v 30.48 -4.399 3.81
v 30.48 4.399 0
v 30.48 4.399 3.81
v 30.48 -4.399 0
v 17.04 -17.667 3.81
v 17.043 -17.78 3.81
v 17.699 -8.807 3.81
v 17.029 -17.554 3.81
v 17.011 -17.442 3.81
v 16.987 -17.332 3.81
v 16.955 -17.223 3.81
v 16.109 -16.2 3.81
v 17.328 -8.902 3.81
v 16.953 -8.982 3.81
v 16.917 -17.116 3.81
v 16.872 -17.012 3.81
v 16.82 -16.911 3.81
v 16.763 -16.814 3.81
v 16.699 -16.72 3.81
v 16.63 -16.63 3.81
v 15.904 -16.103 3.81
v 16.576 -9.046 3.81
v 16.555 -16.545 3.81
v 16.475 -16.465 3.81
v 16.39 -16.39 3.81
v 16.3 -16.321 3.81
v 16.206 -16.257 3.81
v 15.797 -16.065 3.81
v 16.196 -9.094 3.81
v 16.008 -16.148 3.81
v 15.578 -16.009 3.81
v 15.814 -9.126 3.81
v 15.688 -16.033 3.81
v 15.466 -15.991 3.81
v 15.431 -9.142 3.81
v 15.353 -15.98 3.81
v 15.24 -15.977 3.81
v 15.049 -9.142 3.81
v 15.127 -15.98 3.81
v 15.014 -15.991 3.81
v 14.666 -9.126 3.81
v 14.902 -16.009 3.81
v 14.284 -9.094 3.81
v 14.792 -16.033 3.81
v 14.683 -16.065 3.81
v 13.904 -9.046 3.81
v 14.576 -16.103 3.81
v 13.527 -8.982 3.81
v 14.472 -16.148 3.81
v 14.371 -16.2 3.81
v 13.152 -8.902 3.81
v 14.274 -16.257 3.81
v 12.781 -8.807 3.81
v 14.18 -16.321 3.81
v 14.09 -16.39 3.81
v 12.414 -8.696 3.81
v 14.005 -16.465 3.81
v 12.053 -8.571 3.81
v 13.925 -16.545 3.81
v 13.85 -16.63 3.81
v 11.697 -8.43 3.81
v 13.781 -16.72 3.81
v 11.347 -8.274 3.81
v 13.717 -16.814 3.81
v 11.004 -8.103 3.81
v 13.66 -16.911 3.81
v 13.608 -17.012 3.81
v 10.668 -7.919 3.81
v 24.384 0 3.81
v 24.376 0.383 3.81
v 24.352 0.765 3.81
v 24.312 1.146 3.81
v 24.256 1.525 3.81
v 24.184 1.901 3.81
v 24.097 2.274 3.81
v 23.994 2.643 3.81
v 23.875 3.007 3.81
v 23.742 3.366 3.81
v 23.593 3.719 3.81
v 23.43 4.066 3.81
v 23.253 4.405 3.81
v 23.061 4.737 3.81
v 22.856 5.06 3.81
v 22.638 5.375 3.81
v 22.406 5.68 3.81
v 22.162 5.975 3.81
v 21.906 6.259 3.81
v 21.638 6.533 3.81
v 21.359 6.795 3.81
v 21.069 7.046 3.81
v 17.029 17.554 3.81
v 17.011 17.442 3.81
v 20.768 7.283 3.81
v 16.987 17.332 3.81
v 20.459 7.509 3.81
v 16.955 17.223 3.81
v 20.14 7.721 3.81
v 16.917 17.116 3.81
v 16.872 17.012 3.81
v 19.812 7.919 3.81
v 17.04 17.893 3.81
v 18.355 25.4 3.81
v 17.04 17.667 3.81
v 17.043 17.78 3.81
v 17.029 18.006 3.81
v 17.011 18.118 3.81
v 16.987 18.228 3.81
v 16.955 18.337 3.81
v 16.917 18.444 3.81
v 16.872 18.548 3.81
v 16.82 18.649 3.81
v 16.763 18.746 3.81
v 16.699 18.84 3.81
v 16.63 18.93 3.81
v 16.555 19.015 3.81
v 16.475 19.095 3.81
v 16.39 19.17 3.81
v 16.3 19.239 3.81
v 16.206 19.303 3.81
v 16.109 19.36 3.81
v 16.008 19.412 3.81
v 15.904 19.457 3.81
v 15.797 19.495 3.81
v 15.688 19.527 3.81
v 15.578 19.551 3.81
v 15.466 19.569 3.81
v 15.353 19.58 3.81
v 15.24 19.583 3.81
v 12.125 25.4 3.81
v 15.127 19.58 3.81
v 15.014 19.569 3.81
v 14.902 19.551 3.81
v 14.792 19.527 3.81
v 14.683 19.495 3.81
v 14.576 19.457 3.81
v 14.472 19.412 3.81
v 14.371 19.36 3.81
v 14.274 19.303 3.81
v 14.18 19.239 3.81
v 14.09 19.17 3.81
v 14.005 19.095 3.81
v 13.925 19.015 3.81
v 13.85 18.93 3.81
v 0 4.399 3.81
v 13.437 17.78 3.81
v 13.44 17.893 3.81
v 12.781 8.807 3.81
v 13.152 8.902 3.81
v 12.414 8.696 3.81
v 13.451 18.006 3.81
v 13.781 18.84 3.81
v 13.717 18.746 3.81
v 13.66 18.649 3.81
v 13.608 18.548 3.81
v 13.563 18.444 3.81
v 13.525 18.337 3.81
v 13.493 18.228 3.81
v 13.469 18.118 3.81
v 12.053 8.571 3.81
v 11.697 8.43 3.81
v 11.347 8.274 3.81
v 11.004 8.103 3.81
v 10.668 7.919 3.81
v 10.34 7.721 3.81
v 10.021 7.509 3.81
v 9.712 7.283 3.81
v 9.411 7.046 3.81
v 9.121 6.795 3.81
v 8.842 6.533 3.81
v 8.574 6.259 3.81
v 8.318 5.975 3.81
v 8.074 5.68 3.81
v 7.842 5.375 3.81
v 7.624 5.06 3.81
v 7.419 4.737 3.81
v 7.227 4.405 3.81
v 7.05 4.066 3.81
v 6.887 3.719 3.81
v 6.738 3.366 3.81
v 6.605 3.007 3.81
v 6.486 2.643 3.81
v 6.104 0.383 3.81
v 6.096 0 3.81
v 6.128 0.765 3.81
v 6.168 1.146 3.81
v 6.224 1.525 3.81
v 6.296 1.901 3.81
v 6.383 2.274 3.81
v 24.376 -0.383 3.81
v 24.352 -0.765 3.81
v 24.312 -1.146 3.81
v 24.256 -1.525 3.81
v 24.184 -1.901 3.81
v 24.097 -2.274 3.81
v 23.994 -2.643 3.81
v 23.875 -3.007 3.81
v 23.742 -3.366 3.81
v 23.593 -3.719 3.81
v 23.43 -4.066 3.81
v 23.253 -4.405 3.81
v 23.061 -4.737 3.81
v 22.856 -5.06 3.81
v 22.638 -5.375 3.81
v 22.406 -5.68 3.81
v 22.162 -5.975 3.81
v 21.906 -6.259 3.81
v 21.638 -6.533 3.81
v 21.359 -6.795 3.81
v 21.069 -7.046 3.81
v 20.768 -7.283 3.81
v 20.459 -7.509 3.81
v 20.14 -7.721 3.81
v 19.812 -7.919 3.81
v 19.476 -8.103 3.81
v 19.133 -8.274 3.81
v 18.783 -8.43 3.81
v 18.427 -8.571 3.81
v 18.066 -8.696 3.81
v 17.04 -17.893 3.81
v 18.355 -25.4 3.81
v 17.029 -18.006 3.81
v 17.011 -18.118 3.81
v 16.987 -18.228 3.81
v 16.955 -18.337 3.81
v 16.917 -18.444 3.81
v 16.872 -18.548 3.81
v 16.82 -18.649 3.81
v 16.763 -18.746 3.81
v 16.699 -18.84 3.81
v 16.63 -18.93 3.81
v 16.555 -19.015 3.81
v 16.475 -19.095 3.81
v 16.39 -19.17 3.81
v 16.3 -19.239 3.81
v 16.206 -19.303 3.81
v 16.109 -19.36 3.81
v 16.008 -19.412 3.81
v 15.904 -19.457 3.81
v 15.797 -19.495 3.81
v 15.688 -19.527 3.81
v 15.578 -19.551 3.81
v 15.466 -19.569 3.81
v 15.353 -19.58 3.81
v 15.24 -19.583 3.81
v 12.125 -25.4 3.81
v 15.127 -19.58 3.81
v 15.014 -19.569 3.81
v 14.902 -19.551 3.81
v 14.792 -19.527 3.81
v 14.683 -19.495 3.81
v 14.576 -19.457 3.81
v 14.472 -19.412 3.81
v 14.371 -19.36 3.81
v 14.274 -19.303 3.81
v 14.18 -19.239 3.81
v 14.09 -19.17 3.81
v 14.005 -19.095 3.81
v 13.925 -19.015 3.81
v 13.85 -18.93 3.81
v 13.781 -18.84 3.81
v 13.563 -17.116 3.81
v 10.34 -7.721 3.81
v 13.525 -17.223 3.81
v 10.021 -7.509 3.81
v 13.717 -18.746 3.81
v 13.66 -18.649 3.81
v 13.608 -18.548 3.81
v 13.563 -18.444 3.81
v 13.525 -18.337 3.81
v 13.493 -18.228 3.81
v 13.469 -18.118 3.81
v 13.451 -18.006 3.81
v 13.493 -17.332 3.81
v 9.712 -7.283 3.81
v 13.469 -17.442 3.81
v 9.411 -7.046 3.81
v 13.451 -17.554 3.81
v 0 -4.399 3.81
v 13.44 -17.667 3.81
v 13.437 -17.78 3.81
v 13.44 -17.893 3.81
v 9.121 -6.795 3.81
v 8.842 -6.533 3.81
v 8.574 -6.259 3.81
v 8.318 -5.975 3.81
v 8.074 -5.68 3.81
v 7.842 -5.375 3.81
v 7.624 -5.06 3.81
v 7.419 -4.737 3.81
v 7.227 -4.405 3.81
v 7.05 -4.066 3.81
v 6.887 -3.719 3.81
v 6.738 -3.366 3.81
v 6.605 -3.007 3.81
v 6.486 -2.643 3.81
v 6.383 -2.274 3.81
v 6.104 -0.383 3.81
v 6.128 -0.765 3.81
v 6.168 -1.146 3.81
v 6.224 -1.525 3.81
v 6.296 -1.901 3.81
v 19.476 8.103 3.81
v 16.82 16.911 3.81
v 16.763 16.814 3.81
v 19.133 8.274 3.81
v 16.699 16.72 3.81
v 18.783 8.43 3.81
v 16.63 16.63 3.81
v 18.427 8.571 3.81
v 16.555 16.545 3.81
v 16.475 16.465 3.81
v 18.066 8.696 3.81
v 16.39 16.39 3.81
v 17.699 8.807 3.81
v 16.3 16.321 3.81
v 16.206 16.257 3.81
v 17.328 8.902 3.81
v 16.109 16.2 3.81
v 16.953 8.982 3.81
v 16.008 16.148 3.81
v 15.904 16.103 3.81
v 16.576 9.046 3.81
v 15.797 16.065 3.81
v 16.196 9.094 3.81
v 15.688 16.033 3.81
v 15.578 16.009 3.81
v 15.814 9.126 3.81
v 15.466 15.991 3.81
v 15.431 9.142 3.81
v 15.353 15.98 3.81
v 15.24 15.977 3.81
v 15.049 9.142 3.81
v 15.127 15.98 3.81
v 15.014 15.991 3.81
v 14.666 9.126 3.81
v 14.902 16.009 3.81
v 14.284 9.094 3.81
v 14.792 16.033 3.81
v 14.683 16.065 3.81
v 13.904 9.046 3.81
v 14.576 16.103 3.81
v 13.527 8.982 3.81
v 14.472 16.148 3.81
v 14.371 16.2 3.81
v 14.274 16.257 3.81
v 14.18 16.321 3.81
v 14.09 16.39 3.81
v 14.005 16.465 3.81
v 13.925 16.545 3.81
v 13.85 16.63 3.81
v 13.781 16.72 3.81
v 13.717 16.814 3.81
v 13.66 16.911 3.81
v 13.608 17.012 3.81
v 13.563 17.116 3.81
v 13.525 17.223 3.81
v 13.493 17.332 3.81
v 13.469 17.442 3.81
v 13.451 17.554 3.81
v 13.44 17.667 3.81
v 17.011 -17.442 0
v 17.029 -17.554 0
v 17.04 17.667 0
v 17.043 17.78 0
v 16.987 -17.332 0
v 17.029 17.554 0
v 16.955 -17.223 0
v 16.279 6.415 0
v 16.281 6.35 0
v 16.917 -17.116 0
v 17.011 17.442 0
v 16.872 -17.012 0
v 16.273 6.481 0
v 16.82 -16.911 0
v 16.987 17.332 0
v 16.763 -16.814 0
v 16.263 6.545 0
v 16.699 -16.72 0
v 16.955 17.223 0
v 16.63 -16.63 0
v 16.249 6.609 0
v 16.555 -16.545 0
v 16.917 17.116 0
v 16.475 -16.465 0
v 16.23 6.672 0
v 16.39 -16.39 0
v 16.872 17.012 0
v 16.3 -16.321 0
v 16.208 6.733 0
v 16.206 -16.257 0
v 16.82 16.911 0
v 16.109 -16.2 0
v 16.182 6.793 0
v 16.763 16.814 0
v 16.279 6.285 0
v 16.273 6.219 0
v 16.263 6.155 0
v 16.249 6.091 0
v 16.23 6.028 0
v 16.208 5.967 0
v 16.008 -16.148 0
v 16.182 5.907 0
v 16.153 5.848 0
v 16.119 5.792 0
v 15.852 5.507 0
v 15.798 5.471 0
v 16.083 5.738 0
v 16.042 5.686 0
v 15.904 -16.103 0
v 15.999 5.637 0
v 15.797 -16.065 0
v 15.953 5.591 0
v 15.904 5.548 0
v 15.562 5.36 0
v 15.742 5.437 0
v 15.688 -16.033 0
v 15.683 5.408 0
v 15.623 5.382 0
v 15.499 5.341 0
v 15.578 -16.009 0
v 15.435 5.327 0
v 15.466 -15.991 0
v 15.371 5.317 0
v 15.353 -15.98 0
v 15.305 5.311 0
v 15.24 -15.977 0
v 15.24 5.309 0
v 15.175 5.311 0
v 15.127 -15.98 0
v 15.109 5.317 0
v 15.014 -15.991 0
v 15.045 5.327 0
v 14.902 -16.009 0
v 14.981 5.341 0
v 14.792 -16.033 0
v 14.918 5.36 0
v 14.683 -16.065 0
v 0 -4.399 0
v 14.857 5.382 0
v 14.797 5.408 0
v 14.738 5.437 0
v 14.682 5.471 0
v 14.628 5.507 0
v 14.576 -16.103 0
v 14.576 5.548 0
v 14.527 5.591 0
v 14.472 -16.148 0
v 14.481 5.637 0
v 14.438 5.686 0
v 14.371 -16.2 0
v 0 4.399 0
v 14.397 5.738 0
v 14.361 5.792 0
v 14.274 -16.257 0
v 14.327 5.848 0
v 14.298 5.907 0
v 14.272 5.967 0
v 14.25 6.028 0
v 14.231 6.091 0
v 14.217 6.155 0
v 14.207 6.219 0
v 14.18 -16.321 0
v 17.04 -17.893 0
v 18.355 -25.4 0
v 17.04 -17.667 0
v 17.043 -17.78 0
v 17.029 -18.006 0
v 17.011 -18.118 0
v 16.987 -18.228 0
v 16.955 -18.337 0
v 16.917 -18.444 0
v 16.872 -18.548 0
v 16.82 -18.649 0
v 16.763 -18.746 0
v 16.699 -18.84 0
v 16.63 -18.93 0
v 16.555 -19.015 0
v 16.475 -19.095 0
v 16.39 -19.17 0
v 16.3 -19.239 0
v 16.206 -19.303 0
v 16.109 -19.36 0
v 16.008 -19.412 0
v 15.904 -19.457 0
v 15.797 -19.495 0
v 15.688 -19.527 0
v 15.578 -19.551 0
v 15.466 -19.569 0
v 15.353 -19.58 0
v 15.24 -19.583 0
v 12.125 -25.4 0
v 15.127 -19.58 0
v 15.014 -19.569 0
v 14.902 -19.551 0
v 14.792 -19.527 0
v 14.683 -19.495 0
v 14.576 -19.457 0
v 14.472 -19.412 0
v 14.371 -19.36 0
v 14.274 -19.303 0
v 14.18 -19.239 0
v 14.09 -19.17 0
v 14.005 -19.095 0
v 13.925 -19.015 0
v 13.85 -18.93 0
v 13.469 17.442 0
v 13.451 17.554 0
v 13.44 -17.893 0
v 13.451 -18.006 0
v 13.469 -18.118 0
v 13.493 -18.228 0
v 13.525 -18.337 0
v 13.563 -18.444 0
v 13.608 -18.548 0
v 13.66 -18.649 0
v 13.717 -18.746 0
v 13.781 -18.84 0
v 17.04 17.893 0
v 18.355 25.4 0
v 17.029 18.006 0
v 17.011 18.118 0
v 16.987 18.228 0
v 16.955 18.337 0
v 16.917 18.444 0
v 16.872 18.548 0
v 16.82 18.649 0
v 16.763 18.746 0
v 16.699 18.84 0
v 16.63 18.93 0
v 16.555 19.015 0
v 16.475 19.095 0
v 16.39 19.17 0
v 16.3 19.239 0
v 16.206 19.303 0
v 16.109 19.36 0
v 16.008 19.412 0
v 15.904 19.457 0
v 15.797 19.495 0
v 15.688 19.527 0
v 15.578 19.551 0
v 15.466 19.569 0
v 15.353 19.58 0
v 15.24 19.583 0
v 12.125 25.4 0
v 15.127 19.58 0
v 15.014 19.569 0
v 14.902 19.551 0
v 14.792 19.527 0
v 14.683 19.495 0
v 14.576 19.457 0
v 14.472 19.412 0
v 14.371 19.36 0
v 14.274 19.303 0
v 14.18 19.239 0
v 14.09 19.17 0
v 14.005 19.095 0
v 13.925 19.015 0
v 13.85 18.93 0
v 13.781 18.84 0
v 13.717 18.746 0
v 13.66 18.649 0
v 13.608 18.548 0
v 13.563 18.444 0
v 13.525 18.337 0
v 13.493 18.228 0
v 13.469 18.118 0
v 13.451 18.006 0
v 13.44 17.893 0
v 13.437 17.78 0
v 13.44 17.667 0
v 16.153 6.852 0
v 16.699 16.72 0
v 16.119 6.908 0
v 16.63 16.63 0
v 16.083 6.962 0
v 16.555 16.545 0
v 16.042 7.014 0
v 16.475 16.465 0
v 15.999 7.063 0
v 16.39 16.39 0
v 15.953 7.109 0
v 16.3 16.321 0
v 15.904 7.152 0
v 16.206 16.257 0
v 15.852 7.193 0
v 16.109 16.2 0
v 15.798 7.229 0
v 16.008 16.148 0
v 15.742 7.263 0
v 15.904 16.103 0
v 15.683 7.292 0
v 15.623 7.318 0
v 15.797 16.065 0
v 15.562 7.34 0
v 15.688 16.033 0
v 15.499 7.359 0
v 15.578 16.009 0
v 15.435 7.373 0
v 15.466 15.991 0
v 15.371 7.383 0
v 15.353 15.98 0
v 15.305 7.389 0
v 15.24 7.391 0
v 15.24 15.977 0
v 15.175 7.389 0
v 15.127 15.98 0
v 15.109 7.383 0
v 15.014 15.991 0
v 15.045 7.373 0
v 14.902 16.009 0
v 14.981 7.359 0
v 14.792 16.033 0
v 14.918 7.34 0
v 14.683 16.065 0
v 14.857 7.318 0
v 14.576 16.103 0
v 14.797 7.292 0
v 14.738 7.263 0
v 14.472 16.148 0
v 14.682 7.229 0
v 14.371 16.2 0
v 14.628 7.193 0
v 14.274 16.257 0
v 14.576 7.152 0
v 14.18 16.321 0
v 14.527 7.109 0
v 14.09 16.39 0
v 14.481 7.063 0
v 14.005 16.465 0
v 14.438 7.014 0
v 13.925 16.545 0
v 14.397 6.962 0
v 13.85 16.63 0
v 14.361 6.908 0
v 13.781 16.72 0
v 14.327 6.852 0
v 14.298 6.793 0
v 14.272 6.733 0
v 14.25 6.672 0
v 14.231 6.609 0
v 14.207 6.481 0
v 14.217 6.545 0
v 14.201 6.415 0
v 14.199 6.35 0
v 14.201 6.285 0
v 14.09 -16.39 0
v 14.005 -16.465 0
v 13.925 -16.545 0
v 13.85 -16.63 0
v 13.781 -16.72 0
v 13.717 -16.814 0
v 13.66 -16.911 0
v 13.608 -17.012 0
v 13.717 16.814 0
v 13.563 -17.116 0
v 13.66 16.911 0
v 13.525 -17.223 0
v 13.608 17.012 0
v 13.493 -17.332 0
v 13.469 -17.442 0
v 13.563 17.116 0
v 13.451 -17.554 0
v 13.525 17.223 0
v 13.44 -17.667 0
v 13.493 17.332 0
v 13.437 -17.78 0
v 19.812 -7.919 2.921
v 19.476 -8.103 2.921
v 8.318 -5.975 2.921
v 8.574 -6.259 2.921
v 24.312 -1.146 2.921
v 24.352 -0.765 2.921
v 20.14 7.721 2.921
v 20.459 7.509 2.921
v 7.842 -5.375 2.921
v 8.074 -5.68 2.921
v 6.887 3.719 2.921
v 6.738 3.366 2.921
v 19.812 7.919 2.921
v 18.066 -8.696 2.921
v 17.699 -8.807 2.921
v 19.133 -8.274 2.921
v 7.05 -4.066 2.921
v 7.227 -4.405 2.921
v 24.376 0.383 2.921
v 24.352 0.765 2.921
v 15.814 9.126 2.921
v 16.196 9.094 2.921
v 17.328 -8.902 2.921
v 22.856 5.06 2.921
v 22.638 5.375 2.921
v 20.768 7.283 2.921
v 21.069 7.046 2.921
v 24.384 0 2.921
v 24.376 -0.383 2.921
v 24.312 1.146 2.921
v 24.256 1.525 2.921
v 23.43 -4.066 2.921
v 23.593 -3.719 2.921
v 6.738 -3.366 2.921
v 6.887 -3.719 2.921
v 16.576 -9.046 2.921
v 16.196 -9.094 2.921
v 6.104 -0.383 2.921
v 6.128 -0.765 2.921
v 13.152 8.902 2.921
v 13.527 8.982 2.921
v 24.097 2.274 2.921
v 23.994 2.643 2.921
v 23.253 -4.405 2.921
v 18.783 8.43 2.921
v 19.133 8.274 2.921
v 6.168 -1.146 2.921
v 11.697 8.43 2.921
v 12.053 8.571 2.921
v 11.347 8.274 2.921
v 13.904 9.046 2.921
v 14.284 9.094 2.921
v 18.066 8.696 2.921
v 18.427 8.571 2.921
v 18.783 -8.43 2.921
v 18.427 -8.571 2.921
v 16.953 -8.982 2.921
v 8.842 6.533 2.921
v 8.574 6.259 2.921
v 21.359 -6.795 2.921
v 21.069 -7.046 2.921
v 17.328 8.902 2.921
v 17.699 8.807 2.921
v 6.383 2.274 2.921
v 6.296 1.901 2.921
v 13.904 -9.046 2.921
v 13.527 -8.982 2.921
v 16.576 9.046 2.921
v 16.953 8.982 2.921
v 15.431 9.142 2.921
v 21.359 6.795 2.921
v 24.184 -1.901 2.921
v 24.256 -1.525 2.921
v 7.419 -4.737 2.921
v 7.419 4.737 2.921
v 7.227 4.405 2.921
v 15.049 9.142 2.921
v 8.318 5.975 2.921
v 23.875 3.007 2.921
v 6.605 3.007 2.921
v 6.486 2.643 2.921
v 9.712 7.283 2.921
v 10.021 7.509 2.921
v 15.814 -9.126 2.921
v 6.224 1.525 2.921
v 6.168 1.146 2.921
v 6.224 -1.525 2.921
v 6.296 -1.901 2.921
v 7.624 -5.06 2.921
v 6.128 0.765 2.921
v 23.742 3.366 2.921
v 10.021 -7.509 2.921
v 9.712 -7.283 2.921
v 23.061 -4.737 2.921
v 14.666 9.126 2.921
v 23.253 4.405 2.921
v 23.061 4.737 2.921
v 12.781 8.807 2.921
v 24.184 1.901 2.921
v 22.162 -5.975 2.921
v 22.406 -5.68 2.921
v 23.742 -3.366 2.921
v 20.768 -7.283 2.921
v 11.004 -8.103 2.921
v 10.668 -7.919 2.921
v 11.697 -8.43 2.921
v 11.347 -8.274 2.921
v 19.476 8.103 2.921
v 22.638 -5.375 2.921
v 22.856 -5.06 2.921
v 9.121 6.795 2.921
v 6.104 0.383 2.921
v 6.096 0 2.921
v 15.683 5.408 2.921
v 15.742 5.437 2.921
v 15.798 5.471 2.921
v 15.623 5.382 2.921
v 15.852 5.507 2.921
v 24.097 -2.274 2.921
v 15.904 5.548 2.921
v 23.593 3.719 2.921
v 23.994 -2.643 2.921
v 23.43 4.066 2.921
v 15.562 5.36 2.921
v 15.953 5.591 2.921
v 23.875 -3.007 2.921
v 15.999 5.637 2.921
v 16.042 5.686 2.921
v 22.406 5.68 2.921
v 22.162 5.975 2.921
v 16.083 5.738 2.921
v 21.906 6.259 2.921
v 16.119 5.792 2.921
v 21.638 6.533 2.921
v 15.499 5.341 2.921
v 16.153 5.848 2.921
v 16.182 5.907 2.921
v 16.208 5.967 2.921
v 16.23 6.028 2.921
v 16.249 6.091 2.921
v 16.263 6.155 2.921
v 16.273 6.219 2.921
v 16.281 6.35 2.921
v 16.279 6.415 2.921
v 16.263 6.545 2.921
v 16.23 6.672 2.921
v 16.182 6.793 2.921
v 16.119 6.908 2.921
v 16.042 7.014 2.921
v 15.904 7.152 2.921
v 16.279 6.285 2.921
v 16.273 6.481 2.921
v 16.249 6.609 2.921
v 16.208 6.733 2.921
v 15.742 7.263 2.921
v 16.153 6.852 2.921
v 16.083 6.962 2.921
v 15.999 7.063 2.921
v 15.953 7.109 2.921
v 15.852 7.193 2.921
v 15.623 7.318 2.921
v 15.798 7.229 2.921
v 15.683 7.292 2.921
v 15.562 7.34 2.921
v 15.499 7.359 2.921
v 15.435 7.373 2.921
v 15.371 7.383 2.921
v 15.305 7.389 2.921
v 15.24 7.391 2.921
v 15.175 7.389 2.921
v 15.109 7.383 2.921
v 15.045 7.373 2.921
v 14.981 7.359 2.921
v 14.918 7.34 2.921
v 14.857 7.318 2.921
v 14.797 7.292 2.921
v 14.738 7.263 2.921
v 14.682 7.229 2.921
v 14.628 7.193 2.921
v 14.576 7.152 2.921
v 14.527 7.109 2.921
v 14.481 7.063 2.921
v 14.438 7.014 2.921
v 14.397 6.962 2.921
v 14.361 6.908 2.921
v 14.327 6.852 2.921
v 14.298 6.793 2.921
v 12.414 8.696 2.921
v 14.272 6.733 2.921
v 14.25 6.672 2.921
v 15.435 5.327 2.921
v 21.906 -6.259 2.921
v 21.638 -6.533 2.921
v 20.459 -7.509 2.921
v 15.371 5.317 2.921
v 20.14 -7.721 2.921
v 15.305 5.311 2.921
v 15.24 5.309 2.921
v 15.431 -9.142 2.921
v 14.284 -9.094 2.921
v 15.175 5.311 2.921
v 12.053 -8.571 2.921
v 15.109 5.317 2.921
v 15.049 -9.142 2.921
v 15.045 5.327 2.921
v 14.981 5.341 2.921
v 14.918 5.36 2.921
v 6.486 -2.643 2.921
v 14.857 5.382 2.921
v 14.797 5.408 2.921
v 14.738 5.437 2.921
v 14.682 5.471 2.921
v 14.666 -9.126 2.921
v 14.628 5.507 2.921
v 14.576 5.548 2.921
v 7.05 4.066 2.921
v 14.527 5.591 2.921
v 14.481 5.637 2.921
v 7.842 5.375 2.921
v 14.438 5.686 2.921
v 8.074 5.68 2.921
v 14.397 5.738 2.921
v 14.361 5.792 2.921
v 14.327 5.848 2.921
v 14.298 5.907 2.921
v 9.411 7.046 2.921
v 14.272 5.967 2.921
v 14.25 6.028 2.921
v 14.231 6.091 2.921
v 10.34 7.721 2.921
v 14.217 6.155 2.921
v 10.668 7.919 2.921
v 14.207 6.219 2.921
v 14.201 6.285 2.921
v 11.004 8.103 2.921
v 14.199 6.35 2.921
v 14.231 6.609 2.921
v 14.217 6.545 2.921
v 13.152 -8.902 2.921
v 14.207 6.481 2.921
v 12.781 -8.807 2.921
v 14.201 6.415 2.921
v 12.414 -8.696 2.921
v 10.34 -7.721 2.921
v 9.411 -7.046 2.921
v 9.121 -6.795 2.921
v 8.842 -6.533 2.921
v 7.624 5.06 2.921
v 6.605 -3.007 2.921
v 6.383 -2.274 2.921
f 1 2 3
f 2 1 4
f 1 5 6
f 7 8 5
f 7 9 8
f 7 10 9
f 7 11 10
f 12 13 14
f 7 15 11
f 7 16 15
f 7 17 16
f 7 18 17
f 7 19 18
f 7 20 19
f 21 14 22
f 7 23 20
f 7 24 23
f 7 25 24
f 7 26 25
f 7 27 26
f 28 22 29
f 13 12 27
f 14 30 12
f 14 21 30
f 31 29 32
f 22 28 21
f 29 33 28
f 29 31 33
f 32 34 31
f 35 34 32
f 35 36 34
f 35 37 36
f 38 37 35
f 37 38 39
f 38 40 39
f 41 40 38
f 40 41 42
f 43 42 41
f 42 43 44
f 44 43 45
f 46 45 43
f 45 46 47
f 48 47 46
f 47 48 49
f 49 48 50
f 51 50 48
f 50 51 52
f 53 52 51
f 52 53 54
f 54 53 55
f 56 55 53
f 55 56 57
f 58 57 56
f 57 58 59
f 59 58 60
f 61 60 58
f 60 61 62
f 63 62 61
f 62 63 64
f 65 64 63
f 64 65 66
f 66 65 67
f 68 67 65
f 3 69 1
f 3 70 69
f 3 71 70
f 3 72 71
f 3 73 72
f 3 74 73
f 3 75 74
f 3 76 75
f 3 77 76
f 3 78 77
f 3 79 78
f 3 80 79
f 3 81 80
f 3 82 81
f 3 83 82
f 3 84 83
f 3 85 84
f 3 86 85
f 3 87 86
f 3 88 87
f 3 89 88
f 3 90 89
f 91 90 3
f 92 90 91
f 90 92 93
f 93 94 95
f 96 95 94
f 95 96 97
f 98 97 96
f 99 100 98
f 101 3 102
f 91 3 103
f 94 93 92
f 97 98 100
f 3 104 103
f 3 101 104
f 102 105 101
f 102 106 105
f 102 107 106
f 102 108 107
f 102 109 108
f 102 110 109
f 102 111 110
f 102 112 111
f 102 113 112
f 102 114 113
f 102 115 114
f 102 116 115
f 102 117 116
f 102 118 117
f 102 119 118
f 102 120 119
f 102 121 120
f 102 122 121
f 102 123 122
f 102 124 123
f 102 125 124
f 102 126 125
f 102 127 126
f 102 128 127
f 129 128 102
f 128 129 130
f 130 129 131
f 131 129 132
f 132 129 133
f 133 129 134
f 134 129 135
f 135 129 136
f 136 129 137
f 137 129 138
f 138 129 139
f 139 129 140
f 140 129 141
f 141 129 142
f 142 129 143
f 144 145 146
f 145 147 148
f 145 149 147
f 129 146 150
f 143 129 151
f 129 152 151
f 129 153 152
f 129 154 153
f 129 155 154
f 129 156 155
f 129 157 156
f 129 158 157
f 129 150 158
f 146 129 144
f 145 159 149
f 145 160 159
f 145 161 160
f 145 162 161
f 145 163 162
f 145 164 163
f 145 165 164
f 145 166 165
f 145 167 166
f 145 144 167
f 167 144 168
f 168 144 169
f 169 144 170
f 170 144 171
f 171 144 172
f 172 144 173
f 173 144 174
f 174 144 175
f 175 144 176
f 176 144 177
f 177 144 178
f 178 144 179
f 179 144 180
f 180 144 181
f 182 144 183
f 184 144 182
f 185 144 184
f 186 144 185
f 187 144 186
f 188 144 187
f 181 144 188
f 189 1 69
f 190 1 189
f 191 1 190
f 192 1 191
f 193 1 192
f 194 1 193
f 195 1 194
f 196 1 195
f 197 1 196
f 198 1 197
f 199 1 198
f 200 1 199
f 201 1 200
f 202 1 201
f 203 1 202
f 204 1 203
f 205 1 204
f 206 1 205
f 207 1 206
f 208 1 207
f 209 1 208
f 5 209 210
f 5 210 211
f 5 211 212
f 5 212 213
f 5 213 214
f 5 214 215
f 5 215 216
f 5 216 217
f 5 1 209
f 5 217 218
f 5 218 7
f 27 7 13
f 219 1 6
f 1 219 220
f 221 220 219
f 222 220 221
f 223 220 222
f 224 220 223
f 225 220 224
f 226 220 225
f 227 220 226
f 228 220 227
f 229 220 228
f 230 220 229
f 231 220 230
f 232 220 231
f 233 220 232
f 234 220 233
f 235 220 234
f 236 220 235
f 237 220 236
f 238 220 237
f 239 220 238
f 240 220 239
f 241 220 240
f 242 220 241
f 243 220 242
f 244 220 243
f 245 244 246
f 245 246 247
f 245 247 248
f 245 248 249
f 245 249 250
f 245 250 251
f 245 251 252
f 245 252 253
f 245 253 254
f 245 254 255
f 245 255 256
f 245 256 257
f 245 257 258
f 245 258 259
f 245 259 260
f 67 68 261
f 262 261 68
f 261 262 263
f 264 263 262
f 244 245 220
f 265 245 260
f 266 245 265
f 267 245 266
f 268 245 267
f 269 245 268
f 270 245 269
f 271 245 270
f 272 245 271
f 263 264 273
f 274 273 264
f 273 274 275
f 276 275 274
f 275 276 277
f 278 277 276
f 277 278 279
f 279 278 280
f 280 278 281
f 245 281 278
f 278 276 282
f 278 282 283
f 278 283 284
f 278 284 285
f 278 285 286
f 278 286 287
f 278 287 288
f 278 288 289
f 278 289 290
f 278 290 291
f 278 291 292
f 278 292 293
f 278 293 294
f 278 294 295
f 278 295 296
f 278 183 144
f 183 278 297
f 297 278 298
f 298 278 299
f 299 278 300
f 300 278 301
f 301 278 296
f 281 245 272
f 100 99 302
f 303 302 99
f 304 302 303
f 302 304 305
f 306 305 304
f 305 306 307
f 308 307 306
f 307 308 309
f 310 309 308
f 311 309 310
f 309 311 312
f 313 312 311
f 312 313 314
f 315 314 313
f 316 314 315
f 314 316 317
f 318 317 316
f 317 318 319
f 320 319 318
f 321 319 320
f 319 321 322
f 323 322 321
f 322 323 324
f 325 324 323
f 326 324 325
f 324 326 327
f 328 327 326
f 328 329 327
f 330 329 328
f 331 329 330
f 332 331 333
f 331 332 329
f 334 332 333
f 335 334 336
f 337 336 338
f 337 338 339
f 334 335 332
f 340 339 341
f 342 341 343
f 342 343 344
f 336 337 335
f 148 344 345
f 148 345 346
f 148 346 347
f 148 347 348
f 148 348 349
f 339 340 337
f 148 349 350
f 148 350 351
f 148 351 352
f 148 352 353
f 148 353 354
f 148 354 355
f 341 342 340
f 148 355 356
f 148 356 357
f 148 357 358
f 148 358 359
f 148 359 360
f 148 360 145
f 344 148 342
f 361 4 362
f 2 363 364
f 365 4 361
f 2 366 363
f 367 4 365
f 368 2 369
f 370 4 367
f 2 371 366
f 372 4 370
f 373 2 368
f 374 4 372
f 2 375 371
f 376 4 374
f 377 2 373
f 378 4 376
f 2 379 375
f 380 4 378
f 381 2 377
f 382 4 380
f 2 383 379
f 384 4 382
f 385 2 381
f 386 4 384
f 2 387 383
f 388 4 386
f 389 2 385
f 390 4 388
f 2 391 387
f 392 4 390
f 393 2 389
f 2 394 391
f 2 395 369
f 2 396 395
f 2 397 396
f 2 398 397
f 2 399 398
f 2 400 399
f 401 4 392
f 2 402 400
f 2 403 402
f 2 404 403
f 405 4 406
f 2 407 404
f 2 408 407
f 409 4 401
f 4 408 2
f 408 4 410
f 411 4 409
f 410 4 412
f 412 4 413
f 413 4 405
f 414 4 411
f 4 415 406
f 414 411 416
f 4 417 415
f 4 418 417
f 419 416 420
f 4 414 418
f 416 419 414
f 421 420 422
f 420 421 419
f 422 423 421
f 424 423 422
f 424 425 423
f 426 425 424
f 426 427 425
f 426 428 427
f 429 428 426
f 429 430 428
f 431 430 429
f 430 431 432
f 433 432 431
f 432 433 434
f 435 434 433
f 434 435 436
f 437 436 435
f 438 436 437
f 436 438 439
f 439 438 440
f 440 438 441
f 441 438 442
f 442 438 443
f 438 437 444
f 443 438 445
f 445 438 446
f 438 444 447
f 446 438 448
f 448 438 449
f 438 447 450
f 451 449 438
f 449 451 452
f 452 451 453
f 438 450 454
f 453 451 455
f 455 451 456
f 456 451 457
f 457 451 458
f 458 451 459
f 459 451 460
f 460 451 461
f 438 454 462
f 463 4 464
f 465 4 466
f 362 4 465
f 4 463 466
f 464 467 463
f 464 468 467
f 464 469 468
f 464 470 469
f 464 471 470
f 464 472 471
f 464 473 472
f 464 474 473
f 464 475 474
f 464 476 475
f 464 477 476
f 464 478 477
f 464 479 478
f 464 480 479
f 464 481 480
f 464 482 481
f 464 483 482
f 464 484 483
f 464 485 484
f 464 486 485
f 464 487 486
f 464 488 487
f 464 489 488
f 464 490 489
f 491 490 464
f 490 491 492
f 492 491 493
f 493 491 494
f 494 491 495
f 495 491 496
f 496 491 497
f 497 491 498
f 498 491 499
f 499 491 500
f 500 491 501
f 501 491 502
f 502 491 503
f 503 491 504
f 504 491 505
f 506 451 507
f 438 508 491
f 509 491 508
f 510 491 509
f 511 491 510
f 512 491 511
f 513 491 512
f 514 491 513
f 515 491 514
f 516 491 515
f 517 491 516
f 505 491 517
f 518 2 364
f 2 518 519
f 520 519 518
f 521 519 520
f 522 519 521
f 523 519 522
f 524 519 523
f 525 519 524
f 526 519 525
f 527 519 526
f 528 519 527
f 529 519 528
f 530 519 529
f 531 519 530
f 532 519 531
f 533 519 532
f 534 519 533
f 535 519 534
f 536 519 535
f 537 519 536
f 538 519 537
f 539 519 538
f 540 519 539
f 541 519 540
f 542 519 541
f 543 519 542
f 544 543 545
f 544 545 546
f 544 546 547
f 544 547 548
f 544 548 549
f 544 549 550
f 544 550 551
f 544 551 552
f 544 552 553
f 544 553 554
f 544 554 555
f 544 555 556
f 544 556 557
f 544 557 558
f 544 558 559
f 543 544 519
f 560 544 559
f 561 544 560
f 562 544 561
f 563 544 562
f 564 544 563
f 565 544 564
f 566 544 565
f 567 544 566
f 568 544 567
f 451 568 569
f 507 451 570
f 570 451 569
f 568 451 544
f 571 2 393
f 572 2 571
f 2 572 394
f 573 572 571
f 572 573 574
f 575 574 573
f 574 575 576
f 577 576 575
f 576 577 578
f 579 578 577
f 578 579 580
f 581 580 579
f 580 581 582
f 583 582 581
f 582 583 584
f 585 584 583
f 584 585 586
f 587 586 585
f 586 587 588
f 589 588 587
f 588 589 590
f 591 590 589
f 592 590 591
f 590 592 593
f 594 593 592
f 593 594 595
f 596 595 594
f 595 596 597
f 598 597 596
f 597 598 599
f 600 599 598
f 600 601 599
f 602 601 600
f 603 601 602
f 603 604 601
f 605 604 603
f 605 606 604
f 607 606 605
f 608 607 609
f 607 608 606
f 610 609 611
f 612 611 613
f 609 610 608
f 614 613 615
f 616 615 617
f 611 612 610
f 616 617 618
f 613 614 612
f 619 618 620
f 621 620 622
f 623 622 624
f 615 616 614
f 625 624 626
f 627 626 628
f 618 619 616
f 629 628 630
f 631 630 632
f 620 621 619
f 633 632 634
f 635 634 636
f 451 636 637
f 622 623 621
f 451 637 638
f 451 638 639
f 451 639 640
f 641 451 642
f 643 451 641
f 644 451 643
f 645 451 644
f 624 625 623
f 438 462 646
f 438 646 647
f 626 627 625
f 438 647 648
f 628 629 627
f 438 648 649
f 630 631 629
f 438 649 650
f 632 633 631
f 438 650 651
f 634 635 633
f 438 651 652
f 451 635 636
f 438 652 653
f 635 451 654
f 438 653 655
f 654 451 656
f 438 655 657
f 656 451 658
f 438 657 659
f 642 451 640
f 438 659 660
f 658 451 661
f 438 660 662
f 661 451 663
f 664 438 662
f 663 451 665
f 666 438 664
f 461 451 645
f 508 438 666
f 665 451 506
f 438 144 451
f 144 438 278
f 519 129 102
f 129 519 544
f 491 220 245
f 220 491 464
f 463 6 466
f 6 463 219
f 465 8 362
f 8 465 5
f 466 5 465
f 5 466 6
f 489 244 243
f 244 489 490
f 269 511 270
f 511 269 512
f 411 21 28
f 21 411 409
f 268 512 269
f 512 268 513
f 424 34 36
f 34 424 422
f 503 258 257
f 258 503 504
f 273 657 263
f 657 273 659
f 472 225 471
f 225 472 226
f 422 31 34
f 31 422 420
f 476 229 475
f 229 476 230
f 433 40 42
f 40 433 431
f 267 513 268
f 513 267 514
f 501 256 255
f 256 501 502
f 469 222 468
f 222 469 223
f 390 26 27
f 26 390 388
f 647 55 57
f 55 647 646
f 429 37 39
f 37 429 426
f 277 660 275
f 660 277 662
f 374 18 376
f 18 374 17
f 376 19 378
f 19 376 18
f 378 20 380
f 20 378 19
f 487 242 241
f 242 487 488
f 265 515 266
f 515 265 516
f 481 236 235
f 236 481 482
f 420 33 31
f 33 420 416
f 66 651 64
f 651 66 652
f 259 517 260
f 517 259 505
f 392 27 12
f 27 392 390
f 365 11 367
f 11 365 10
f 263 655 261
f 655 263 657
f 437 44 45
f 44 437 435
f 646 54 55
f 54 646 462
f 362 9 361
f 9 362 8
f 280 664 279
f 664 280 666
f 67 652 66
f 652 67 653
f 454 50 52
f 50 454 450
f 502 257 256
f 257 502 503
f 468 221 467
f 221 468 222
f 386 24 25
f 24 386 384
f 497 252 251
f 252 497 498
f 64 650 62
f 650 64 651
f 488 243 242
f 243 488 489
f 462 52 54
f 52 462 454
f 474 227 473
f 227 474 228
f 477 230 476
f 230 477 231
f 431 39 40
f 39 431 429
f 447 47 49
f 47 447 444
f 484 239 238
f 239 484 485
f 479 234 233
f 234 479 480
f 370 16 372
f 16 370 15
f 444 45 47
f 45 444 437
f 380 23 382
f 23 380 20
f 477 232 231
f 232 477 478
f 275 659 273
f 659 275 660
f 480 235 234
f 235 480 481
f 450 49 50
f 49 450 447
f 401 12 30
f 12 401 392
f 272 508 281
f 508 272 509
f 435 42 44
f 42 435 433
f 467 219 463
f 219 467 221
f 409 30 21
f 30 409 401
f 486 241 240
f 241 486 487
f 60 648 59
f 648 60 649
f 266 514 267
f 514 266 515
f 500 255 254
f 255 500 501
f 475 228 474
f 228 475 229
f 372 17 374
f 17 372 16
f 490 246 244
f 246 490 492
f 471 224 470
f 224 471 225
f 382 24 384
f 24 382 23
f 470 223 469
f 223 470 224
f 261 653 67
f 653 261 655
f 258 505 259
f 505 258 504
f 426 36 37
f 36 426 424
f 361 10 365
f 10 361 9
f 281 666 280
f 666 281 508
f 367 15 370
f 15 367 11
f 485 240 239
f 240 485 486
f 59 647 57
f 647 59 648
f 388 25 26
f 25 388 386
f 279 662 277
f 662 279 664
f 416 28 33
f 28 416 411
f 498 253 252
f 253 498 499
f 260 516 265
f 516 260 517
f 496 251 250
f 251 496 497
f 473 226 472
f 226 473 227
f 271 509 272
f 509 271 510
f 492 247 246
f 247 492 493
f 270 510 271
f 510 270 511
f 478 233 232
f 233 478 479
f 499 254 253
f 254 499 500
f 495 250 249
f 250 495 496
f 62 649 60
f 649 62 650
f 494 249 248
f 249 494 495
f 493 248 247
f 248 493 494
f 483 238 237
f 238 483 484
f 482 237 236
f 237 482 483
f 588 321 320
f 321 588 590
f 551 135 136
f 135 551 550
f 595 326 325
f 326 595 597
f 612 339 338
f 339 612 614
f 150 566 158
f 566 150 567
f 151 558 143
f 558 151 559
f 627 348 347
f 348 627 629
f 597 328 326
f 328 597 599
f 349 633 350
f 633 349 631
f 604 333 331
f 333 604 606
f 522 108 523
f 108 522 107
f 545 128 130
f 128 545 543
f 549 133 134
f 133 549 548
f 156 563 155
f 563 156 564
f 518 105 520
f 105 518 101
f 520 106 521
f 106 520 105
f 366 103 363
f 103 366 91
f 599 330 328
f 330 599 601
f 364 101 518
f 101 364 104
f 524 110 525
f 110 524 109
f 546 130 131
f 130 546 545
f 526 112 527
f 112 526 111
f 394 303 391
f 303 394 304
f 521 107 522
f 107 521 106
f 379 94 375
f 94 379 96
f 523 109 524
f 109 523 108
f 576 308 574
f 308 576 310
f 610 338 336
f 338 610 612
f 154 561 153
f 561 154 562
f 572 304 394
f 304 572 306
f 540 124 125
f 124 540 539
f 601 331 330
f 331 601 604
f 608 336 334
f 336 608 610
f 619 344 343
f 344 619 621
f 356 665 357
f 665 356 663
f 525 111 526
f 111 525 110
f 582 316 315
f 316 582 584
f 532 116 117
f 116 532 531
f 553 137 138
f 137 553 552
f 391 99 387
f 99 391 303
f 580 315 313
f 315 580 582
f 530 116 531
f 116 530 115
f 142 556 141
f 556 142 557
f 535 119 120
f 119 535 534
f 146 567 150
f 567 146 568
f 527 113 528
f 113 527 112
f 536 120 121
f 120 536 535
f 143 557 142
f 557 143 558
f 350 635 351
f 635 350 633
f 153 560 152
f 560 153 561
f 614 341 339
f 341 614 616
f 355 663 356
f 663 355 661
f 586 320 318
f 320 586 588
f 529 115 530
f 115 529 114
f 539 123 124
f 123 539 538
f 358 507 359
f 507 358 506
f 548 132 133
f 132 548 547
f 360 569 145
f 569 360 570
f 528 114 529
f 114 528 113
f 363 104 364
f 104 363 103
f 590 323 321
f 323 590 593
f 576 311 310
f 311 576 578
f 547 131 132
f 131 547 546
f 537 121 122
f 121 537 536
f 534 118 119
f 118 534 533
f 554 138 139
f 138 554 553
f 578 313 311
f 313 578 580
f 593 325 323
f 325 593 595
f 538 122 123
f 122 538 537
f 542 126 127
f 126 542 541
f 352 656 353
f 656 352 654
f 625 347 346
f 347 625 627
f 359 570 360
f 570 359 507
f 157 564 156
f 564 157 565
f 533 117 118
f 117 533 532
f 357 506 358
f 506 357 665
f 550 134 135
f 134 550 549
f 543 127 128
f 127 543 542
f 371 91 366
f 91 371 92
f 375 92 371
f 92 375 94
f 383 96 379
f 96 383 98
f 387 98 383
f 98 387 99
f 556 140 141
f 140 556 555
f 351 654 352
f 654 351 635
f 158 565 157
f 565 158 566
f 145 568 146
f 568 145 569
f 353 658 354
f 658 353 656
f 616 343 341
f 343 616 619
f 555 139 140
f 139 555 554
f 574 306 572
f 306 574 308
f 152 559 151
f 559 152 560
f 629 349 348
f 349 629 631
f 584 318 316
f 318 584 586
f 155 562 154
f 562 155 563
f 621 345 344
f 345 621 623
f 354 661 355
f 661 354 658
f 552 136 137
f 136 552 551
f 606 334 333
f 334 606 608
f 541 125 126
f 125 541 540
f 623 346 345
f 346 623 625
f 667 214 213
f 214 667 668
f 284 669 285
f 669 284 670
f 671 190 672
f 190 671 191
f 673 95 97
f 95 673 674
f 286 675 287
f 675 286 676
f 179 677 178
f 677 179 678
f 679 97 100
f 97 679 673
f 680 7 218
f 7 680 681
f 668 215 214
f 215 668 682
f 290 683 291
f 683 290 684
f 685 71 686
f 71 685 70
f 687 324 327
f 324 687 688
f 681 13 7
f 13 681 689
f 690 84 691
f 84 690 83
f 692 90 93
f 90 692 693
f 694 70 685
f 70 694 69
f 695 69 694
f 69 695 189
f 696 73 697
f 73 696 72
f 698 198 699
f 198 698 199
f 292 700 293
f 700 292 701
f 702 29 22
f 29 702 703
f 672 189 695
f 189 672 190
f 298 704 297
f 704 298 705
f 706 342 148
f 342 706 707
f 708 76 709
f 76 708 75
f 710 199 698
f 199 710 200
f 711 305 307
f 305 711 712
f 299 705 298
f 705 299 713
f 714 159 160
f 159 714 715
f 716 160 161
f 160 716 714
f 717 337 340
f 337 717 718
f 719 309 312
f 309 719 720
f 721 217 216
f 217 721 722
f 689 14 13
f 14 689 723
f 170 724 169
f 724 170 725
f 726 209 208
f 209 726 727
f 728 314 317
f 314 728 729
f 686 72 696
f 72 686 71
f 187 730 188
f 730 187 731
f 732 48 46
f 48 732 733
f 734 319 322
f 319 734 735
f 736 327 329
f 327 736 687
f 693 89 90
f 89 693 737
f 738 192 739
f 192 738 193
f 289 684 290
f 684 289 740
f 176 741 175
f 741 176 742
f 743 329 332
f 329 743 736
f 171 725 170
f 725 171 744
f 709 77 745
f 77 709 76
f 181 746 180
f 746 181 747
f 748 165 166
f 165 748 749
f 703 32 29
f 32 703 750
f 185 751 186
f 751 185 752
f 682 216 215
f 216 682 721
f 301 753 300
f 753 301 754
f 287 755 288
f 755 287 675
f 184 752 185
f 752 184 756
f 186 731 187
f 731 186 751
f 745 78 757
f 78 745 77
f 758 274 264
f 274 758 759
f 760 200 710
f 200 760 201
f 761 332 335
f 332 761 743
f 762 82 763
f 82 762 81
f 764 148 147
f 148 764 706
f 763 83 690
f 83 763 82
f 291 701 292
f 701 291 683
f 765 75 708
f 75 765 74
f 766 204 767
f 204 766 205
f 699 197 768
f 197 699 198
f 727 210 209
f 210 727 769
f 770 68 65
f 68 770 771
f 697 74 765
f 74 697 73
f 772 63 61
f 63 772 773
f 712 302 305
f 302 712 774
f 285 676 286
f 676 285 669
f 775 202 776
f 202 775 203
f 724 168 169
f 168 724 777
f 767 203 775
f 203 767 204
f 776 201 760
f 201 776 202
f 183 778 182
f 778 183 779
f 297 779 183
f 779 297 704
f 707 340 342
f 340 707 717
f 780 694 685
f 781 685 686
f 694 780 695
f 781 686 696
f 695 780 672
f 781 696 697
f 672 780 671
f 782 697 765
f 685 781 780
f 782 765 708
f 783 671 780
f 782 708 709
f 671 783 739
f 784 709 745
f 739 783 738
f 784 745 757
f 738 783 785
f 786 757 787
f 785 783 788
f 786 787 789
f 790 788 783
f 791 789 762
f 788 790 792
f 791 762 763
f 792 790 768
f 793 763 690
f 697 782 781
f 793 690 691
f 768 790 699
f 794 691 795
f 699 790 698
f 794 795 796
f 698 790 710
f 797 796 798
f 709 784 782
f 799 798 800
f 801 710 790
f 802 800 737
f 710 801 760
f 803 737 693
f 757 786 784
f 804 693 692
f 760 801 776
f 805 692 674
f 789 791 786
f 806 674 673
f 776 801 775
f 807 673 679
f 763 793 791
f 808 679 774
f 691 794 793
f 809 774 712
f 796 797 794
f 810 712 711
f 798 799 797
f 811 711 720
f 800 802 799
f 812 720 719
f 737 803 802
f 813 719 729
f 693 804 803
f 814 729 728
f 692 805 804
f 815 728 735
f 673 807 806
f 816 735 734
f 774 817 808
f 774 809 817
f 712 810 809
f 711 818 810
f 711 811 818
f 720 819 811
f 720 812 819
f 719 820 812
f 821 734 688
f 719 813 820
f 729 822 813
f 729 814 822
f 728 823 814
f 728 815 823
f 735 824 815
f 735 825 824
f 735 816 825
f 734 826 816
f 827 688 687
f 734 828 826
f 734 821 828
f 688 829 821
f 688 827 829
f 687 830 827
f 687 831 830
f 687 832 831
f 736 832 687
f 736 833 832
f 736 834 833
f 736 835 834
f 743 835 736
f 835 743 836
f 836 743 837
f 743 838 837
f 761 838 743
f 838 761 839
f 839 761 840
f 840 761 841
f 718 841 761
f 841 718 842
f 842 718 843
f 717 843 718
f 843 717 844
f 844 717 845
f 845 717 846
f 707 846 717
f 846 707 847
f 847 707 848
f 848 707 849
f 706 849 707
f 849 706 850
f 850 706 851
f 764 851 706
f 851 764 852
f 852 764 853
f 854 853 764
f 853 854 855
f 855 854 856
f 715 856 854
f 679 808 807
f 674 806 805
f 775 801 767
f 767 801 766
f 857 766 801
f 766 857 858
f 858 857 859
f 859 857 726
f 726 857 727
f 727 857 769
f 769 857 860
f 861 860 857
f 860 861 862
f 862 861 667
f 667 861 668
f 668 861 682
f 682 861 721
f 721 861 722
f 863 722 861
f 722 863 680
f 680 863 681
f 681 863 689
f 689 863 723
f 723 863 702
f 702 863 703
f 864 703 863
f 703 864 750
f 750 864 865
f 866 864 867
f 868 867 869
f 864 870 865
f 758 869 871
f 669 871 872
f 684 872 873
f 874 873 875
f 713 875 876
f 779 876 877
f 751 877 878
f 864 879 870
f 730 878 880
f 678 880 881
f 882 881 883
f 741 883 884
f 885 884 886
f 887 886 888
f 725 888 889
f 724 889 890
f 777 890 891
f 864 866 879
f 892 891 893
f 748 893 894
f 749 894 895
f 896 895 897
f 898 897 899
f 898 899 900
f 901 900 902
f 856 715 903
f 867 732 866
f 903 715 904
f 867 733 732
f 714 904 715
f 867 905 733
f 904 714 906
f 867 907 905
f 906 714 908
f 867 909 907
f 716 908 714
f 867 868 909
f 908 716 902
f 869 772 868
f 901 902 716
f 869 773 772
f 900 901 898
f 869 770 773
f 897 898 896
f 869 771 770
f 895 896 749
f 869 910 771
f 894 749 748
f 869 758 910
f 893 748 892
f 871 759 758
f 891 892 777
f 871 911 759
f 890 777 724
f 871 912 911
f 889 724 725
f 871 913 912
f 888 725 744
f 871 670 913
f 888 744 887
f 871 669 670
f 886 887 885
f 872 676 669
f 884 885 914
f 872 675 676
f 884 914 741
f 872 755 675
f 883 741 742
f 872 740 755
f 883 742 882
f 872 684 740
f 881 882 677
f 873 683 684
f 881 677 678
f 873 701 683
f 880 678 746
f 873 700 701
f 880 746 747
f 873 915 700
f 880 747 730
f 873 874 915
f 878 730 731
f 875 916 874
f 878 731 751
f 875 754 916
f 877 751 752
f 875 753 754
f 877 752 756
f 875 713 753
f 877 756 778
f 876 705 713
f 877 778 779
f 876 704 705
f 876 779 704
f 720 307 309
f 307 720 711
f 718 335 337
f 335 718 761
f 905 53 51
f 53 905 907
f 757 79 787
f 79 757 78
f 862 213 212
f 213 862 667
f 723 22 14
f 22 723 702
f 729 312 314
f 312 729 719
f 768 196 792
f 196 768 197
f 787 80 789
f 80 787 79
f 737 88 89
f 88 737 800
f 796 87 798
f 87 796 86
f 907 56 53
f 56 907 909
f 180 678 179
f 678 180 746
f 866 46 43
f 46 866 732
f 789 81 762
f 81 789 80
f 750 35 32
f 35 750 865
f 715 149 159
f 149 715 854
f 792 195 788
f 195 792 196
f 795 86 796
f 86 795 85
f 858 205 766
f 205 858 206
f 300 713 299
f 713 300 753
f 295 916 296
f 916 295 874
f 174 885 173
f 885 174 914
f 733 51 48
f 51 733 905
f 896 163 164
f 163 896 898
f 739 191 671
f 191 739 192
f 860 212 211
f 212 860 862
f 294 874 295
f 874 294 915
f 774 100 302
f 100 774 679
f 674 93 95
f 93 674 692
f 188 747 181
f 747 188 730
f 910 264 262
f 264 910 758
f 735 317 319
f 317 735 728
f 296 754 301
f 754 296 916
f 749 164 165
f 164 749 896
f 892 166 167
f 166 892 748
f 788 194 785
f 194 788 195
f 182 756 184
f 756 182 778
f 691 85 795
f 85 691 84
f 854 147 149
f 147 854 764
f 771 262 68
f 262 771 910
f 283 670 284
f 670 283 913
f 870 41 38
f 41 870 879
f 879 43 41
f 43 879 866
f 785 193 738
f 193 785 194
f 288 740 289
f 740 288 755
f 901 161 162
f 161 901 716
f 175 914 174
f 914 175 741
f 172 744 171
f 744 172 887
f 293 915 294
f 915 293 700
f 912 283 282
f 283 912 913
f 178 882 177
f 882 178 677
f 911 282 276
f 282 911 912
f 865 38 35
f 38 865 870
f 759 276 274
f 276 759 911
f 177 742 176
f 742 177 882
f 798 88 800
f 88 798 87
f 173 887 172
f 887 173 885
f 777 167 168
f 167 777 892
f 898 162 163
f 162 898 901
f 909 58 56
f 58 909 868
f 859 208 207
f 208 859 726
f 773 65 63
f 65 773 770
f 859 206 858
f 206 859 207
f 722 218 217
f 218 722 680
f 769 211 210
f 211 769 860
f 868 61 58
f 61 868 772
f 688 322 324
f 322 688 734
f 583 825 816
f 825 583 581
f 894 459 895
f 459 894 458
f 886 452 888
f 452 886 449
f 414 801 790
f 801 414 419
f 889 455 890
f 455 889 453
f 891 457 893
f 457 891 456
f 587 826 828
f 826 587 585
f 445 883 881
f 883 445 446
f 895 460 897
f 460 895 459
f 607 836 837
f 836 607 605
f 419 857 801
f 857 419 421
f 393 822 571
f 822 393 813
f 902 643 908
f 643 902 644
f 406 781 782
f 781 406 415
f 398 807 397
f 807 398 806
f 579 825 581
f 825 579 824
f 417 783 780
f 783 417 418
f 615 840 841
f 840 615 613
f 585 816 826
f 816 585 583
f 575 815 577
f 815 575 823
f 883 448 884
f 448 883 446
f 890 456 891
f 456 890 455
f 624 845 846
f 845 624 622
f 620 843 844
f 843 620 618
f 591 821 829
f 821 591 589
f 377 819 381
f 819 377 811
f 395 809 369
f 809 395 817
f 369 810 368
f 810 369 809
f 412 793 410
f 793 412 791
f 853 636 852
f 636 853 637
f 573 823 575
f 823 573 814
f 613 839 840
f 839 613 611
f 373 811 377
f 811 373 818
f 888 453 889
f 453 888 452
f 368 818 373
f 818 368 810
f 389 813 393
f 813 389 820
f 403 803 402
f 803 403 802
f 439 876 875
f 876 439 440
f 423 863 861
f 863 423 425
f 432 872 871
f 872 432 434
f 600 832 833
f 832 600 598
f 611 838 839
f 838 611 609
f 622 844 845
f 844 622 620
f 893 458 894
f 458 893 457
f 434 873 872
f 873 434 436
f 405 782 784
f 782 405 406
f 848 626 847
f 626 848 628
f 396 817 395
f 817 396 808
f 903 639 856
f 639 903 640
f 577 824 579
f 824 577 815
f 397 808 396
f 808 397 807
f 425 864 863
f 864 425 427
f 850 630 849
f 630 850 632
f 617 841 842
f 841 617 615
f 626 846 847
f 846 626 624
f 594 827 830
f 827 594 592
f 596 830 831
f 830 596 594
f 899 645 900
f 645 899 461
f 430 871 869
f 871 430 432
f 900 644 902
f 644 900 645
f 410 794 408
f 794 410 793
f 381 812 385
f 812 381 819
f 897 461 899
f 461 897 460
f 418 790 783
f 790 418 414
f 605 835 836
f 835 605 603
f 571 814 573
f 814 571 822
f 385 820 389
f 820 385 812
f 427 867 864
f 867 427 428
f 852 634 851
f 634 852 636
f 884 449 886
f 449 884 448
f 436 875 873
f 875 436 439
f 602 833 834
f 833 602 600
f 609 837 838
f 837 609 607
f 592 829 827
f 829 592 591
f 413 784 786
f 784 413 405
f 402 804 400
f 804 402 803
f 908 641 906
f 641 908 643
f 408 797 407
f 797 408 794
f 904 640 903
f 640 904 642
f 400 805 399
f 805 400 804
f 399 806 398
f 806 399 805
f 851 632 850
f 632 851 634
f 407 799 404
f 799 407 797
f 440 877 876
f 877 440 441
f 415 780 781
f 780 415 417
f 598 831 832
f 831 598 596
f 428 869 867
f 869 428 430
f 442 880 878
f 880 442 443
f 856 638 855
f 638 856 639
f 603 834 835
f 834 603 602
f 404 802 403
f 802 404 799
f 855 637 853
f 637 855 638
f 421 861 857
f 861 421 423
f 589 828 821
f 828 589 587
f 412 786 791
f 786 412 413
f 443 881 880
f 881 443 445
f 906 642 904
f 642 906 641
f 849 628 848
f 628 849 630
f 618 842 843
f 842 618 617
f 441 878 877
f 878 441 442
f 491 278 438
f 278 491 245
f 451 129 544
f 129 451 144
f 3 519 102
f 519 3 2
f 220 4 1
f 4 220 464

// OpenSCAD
/* OpenSCAD file to make a bullet sizer
 * Tom Trebisky  6-16-2026
 */

mmpi = 25.4;
function mm(x) = x * mmpi;

thick = mm ( 0.15 );
width = mm ( 1.2 );
length = mm ( 2.0 );

// dimensions of drill hole
// This came out .129 and I will need to drill it
// to pass a 6-32 bolt (which is .135).
d_diam = mm ( 0.142 );
d_len = thick * 2.0;

// location of drill holes
x1 = mm ( 0.6 );
y1 = mm ( 0.3 );
x2 = mm ( 0.6 );
y2 = mm ( 1.7 );

// location of cup
xc = mm ( 0.6 );
yc = mm ( 1.0 );
c_diam = mm ( 0.72 );
c_len = mm ( 1.0 );
c_dent = mm ( 0.035 );

w_diam = mm ( 0.082 );
w_len = mm ( 1.0 );
xw = mm ( 0.6 );
yw = mm ( 1.25 );

module wire (x, y) {
    translate ( [ x, y, 0.0 ] )
    translate ( [ 0.0, 0.0, -thick/2.0 ] )
    cylinder ( d=w_diam, h=w_len, $fn=100 );
}

module drill (x, y) {
    translate ( [ x, y, 0.0 ] )
    translate ( [ 0.0, 0.0, -thick/2.0 ] )
    cylinder ( d=d_diam, h=d_len, $fn=100 );
}

module cup ( x, y ) {
	zc = thick - c_dent;
	translate ( [ x, y, zc ] )
	cylinder ( d=c_diam, h=c_len, $fn=150 );
}

// The first coord x is left to right
// The second coord y is front to back, + to the rear
// The last coord z is up and down
module slab () {
		cube ( [ width, length, thick ] );
}

module corner ( rot, right ) {
		w = mm ( 2.0 );	
		l = mm ( 4.0 );	
		t = mm ( 1.0 );	
		fudge = mm ( 0.1 );

		if ( right ) {
			translate ( [ fudge, 0, 0 ] )
			translate ( [ width, 0, 0 ] )
			rotate ( [ 0.0, 0.0, rot] )
			translate ( [ 0.0, -l/2.0, -t/2.0 ] )
			cube ( [ w, l, t ] );
		} else {
			// works
			// rotates ccw about Z
			translate ( [ -fudge, 0, 0 ] )
			rotate ( [ 0.0, 0.0, rot] )
			translate ( [ -w, -l/2.0, -t/2.0 ] )
			cube ( [ w, l, t ] );
		}
}

module plate () {
	translate ( [ 0, -length/2.0, 0 ] )
	difference () {
		slab ();
		drill ( x1, y1 );
		drill ( x2, y2 );
		cup ( xc, yc );
		wire ( xw, yw );
	}
}

// Using union is very handy for debugging.

// union () {
difference () {
	plate ();
	corner ( 30.0, false );
	corner ( -30.0, false );
	corner ( 30.0, true );
	corner ( -30.0, true );
}

// THE END
